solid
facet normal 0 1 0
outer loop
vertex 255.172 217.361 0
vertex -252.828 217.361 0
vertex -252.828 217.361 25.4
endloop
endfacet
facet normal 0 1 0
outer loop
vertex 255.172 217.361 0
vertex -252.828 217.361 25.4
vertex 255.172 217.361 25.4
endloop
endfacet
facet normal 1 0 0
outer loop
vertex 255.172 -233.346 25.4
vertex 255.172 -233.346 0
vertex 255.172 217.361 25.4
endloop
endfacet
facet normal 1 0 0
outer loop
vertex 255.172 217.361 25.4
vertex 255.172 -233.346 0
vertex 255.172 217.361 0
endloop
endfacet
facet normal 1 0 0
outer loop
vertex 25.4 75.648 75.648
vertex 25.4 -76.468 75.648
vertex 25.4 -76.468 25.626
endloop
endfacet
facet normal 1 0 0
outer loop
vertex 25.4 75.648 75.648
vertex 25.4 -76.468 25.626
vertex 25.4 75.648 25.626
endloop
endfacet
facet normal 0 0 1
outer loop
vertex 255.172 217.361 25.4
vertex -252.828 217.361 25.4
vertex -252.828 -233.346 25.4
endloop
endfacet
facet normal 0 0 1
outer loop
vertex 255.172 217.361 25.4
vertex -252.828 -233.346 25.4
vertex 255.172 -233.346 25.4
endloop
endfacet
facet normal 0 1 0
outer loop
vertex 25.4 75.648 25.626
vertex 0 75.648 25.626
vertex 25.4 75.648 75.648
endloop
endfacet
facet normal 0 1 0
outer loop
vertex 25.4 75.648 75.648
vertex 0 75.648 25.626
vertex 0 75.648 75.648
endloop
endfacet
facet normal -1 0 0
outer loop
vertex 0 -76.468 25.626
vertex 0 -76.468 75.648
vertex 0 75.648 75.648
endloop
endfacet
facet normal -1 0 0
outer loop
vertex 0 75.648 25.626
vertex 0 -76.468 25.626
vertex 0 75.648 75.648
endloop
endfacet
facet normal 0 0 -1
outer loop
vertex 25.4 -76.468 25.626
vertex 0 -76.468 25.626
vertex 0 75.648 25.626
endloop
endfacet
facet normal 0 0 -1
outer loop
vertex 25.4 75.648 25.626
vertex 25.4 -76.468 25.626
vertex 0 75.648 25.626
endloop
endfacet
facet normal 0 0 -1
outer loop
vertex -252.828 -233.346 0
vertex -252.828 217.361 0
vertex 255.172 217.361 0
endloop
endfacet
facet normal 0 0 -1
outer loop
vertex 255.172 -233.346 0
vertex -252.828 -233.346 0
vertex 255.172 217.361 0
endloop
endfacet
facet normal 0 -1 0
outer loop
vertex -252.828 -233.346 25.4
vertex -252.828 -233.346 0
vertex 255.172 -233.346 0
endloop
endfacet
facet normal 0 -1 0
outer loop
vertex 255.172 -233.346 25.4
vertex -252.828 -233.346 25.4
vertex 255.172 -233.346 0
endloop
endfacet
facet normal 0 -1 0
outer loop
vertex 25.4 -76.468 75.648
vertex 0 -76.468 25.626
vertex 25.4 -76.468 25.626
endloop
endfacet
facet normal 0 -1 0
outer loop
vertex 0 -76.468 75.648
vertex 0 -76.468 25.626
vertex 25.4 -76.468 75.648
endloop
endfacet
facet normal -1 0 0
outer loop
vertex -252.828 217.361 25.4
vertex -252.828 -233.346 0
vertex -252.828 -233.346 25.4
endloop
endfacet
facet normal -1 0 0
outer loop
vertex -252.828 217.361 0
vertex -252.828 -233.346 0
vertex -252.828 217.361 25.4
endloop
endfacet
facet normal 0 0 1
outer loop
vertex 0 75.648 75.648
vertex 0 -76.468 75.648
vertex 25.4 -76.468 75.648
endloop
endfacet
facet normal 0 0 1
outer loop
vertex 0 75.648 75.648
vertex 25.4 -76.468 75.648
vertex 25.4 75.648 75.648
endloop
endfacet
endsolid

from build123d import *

# Parameters (mm, degrees)
F0_W     = 508
F0_H     = 450.706772
F1_DEPTH = 25.4
F2_W     = 152.116783
F2_H     = 50.022224
F3_DEPTH = 25.4


with BuildPart() as f1:
    # F0 (on Top) → F1 (new body)
    with BuildSketch(Plane.XY):
        with Locations((1.17225, -7.992605)):
            Rectangle(F0_W, F0_H)
    extrude(amount=F1_DEPTH)


with BuildPart() as f3:
    # F2 (on Right) → F3 (new body)
    with BuildSketch(Plane.YZ):
        with Locations((-0.410016, 50.637248)):
            Rectangle(F2_W, F2_H)
    extrude(amount=F3_DEPTH)


solid = Compound([f1.part, f3.part])
